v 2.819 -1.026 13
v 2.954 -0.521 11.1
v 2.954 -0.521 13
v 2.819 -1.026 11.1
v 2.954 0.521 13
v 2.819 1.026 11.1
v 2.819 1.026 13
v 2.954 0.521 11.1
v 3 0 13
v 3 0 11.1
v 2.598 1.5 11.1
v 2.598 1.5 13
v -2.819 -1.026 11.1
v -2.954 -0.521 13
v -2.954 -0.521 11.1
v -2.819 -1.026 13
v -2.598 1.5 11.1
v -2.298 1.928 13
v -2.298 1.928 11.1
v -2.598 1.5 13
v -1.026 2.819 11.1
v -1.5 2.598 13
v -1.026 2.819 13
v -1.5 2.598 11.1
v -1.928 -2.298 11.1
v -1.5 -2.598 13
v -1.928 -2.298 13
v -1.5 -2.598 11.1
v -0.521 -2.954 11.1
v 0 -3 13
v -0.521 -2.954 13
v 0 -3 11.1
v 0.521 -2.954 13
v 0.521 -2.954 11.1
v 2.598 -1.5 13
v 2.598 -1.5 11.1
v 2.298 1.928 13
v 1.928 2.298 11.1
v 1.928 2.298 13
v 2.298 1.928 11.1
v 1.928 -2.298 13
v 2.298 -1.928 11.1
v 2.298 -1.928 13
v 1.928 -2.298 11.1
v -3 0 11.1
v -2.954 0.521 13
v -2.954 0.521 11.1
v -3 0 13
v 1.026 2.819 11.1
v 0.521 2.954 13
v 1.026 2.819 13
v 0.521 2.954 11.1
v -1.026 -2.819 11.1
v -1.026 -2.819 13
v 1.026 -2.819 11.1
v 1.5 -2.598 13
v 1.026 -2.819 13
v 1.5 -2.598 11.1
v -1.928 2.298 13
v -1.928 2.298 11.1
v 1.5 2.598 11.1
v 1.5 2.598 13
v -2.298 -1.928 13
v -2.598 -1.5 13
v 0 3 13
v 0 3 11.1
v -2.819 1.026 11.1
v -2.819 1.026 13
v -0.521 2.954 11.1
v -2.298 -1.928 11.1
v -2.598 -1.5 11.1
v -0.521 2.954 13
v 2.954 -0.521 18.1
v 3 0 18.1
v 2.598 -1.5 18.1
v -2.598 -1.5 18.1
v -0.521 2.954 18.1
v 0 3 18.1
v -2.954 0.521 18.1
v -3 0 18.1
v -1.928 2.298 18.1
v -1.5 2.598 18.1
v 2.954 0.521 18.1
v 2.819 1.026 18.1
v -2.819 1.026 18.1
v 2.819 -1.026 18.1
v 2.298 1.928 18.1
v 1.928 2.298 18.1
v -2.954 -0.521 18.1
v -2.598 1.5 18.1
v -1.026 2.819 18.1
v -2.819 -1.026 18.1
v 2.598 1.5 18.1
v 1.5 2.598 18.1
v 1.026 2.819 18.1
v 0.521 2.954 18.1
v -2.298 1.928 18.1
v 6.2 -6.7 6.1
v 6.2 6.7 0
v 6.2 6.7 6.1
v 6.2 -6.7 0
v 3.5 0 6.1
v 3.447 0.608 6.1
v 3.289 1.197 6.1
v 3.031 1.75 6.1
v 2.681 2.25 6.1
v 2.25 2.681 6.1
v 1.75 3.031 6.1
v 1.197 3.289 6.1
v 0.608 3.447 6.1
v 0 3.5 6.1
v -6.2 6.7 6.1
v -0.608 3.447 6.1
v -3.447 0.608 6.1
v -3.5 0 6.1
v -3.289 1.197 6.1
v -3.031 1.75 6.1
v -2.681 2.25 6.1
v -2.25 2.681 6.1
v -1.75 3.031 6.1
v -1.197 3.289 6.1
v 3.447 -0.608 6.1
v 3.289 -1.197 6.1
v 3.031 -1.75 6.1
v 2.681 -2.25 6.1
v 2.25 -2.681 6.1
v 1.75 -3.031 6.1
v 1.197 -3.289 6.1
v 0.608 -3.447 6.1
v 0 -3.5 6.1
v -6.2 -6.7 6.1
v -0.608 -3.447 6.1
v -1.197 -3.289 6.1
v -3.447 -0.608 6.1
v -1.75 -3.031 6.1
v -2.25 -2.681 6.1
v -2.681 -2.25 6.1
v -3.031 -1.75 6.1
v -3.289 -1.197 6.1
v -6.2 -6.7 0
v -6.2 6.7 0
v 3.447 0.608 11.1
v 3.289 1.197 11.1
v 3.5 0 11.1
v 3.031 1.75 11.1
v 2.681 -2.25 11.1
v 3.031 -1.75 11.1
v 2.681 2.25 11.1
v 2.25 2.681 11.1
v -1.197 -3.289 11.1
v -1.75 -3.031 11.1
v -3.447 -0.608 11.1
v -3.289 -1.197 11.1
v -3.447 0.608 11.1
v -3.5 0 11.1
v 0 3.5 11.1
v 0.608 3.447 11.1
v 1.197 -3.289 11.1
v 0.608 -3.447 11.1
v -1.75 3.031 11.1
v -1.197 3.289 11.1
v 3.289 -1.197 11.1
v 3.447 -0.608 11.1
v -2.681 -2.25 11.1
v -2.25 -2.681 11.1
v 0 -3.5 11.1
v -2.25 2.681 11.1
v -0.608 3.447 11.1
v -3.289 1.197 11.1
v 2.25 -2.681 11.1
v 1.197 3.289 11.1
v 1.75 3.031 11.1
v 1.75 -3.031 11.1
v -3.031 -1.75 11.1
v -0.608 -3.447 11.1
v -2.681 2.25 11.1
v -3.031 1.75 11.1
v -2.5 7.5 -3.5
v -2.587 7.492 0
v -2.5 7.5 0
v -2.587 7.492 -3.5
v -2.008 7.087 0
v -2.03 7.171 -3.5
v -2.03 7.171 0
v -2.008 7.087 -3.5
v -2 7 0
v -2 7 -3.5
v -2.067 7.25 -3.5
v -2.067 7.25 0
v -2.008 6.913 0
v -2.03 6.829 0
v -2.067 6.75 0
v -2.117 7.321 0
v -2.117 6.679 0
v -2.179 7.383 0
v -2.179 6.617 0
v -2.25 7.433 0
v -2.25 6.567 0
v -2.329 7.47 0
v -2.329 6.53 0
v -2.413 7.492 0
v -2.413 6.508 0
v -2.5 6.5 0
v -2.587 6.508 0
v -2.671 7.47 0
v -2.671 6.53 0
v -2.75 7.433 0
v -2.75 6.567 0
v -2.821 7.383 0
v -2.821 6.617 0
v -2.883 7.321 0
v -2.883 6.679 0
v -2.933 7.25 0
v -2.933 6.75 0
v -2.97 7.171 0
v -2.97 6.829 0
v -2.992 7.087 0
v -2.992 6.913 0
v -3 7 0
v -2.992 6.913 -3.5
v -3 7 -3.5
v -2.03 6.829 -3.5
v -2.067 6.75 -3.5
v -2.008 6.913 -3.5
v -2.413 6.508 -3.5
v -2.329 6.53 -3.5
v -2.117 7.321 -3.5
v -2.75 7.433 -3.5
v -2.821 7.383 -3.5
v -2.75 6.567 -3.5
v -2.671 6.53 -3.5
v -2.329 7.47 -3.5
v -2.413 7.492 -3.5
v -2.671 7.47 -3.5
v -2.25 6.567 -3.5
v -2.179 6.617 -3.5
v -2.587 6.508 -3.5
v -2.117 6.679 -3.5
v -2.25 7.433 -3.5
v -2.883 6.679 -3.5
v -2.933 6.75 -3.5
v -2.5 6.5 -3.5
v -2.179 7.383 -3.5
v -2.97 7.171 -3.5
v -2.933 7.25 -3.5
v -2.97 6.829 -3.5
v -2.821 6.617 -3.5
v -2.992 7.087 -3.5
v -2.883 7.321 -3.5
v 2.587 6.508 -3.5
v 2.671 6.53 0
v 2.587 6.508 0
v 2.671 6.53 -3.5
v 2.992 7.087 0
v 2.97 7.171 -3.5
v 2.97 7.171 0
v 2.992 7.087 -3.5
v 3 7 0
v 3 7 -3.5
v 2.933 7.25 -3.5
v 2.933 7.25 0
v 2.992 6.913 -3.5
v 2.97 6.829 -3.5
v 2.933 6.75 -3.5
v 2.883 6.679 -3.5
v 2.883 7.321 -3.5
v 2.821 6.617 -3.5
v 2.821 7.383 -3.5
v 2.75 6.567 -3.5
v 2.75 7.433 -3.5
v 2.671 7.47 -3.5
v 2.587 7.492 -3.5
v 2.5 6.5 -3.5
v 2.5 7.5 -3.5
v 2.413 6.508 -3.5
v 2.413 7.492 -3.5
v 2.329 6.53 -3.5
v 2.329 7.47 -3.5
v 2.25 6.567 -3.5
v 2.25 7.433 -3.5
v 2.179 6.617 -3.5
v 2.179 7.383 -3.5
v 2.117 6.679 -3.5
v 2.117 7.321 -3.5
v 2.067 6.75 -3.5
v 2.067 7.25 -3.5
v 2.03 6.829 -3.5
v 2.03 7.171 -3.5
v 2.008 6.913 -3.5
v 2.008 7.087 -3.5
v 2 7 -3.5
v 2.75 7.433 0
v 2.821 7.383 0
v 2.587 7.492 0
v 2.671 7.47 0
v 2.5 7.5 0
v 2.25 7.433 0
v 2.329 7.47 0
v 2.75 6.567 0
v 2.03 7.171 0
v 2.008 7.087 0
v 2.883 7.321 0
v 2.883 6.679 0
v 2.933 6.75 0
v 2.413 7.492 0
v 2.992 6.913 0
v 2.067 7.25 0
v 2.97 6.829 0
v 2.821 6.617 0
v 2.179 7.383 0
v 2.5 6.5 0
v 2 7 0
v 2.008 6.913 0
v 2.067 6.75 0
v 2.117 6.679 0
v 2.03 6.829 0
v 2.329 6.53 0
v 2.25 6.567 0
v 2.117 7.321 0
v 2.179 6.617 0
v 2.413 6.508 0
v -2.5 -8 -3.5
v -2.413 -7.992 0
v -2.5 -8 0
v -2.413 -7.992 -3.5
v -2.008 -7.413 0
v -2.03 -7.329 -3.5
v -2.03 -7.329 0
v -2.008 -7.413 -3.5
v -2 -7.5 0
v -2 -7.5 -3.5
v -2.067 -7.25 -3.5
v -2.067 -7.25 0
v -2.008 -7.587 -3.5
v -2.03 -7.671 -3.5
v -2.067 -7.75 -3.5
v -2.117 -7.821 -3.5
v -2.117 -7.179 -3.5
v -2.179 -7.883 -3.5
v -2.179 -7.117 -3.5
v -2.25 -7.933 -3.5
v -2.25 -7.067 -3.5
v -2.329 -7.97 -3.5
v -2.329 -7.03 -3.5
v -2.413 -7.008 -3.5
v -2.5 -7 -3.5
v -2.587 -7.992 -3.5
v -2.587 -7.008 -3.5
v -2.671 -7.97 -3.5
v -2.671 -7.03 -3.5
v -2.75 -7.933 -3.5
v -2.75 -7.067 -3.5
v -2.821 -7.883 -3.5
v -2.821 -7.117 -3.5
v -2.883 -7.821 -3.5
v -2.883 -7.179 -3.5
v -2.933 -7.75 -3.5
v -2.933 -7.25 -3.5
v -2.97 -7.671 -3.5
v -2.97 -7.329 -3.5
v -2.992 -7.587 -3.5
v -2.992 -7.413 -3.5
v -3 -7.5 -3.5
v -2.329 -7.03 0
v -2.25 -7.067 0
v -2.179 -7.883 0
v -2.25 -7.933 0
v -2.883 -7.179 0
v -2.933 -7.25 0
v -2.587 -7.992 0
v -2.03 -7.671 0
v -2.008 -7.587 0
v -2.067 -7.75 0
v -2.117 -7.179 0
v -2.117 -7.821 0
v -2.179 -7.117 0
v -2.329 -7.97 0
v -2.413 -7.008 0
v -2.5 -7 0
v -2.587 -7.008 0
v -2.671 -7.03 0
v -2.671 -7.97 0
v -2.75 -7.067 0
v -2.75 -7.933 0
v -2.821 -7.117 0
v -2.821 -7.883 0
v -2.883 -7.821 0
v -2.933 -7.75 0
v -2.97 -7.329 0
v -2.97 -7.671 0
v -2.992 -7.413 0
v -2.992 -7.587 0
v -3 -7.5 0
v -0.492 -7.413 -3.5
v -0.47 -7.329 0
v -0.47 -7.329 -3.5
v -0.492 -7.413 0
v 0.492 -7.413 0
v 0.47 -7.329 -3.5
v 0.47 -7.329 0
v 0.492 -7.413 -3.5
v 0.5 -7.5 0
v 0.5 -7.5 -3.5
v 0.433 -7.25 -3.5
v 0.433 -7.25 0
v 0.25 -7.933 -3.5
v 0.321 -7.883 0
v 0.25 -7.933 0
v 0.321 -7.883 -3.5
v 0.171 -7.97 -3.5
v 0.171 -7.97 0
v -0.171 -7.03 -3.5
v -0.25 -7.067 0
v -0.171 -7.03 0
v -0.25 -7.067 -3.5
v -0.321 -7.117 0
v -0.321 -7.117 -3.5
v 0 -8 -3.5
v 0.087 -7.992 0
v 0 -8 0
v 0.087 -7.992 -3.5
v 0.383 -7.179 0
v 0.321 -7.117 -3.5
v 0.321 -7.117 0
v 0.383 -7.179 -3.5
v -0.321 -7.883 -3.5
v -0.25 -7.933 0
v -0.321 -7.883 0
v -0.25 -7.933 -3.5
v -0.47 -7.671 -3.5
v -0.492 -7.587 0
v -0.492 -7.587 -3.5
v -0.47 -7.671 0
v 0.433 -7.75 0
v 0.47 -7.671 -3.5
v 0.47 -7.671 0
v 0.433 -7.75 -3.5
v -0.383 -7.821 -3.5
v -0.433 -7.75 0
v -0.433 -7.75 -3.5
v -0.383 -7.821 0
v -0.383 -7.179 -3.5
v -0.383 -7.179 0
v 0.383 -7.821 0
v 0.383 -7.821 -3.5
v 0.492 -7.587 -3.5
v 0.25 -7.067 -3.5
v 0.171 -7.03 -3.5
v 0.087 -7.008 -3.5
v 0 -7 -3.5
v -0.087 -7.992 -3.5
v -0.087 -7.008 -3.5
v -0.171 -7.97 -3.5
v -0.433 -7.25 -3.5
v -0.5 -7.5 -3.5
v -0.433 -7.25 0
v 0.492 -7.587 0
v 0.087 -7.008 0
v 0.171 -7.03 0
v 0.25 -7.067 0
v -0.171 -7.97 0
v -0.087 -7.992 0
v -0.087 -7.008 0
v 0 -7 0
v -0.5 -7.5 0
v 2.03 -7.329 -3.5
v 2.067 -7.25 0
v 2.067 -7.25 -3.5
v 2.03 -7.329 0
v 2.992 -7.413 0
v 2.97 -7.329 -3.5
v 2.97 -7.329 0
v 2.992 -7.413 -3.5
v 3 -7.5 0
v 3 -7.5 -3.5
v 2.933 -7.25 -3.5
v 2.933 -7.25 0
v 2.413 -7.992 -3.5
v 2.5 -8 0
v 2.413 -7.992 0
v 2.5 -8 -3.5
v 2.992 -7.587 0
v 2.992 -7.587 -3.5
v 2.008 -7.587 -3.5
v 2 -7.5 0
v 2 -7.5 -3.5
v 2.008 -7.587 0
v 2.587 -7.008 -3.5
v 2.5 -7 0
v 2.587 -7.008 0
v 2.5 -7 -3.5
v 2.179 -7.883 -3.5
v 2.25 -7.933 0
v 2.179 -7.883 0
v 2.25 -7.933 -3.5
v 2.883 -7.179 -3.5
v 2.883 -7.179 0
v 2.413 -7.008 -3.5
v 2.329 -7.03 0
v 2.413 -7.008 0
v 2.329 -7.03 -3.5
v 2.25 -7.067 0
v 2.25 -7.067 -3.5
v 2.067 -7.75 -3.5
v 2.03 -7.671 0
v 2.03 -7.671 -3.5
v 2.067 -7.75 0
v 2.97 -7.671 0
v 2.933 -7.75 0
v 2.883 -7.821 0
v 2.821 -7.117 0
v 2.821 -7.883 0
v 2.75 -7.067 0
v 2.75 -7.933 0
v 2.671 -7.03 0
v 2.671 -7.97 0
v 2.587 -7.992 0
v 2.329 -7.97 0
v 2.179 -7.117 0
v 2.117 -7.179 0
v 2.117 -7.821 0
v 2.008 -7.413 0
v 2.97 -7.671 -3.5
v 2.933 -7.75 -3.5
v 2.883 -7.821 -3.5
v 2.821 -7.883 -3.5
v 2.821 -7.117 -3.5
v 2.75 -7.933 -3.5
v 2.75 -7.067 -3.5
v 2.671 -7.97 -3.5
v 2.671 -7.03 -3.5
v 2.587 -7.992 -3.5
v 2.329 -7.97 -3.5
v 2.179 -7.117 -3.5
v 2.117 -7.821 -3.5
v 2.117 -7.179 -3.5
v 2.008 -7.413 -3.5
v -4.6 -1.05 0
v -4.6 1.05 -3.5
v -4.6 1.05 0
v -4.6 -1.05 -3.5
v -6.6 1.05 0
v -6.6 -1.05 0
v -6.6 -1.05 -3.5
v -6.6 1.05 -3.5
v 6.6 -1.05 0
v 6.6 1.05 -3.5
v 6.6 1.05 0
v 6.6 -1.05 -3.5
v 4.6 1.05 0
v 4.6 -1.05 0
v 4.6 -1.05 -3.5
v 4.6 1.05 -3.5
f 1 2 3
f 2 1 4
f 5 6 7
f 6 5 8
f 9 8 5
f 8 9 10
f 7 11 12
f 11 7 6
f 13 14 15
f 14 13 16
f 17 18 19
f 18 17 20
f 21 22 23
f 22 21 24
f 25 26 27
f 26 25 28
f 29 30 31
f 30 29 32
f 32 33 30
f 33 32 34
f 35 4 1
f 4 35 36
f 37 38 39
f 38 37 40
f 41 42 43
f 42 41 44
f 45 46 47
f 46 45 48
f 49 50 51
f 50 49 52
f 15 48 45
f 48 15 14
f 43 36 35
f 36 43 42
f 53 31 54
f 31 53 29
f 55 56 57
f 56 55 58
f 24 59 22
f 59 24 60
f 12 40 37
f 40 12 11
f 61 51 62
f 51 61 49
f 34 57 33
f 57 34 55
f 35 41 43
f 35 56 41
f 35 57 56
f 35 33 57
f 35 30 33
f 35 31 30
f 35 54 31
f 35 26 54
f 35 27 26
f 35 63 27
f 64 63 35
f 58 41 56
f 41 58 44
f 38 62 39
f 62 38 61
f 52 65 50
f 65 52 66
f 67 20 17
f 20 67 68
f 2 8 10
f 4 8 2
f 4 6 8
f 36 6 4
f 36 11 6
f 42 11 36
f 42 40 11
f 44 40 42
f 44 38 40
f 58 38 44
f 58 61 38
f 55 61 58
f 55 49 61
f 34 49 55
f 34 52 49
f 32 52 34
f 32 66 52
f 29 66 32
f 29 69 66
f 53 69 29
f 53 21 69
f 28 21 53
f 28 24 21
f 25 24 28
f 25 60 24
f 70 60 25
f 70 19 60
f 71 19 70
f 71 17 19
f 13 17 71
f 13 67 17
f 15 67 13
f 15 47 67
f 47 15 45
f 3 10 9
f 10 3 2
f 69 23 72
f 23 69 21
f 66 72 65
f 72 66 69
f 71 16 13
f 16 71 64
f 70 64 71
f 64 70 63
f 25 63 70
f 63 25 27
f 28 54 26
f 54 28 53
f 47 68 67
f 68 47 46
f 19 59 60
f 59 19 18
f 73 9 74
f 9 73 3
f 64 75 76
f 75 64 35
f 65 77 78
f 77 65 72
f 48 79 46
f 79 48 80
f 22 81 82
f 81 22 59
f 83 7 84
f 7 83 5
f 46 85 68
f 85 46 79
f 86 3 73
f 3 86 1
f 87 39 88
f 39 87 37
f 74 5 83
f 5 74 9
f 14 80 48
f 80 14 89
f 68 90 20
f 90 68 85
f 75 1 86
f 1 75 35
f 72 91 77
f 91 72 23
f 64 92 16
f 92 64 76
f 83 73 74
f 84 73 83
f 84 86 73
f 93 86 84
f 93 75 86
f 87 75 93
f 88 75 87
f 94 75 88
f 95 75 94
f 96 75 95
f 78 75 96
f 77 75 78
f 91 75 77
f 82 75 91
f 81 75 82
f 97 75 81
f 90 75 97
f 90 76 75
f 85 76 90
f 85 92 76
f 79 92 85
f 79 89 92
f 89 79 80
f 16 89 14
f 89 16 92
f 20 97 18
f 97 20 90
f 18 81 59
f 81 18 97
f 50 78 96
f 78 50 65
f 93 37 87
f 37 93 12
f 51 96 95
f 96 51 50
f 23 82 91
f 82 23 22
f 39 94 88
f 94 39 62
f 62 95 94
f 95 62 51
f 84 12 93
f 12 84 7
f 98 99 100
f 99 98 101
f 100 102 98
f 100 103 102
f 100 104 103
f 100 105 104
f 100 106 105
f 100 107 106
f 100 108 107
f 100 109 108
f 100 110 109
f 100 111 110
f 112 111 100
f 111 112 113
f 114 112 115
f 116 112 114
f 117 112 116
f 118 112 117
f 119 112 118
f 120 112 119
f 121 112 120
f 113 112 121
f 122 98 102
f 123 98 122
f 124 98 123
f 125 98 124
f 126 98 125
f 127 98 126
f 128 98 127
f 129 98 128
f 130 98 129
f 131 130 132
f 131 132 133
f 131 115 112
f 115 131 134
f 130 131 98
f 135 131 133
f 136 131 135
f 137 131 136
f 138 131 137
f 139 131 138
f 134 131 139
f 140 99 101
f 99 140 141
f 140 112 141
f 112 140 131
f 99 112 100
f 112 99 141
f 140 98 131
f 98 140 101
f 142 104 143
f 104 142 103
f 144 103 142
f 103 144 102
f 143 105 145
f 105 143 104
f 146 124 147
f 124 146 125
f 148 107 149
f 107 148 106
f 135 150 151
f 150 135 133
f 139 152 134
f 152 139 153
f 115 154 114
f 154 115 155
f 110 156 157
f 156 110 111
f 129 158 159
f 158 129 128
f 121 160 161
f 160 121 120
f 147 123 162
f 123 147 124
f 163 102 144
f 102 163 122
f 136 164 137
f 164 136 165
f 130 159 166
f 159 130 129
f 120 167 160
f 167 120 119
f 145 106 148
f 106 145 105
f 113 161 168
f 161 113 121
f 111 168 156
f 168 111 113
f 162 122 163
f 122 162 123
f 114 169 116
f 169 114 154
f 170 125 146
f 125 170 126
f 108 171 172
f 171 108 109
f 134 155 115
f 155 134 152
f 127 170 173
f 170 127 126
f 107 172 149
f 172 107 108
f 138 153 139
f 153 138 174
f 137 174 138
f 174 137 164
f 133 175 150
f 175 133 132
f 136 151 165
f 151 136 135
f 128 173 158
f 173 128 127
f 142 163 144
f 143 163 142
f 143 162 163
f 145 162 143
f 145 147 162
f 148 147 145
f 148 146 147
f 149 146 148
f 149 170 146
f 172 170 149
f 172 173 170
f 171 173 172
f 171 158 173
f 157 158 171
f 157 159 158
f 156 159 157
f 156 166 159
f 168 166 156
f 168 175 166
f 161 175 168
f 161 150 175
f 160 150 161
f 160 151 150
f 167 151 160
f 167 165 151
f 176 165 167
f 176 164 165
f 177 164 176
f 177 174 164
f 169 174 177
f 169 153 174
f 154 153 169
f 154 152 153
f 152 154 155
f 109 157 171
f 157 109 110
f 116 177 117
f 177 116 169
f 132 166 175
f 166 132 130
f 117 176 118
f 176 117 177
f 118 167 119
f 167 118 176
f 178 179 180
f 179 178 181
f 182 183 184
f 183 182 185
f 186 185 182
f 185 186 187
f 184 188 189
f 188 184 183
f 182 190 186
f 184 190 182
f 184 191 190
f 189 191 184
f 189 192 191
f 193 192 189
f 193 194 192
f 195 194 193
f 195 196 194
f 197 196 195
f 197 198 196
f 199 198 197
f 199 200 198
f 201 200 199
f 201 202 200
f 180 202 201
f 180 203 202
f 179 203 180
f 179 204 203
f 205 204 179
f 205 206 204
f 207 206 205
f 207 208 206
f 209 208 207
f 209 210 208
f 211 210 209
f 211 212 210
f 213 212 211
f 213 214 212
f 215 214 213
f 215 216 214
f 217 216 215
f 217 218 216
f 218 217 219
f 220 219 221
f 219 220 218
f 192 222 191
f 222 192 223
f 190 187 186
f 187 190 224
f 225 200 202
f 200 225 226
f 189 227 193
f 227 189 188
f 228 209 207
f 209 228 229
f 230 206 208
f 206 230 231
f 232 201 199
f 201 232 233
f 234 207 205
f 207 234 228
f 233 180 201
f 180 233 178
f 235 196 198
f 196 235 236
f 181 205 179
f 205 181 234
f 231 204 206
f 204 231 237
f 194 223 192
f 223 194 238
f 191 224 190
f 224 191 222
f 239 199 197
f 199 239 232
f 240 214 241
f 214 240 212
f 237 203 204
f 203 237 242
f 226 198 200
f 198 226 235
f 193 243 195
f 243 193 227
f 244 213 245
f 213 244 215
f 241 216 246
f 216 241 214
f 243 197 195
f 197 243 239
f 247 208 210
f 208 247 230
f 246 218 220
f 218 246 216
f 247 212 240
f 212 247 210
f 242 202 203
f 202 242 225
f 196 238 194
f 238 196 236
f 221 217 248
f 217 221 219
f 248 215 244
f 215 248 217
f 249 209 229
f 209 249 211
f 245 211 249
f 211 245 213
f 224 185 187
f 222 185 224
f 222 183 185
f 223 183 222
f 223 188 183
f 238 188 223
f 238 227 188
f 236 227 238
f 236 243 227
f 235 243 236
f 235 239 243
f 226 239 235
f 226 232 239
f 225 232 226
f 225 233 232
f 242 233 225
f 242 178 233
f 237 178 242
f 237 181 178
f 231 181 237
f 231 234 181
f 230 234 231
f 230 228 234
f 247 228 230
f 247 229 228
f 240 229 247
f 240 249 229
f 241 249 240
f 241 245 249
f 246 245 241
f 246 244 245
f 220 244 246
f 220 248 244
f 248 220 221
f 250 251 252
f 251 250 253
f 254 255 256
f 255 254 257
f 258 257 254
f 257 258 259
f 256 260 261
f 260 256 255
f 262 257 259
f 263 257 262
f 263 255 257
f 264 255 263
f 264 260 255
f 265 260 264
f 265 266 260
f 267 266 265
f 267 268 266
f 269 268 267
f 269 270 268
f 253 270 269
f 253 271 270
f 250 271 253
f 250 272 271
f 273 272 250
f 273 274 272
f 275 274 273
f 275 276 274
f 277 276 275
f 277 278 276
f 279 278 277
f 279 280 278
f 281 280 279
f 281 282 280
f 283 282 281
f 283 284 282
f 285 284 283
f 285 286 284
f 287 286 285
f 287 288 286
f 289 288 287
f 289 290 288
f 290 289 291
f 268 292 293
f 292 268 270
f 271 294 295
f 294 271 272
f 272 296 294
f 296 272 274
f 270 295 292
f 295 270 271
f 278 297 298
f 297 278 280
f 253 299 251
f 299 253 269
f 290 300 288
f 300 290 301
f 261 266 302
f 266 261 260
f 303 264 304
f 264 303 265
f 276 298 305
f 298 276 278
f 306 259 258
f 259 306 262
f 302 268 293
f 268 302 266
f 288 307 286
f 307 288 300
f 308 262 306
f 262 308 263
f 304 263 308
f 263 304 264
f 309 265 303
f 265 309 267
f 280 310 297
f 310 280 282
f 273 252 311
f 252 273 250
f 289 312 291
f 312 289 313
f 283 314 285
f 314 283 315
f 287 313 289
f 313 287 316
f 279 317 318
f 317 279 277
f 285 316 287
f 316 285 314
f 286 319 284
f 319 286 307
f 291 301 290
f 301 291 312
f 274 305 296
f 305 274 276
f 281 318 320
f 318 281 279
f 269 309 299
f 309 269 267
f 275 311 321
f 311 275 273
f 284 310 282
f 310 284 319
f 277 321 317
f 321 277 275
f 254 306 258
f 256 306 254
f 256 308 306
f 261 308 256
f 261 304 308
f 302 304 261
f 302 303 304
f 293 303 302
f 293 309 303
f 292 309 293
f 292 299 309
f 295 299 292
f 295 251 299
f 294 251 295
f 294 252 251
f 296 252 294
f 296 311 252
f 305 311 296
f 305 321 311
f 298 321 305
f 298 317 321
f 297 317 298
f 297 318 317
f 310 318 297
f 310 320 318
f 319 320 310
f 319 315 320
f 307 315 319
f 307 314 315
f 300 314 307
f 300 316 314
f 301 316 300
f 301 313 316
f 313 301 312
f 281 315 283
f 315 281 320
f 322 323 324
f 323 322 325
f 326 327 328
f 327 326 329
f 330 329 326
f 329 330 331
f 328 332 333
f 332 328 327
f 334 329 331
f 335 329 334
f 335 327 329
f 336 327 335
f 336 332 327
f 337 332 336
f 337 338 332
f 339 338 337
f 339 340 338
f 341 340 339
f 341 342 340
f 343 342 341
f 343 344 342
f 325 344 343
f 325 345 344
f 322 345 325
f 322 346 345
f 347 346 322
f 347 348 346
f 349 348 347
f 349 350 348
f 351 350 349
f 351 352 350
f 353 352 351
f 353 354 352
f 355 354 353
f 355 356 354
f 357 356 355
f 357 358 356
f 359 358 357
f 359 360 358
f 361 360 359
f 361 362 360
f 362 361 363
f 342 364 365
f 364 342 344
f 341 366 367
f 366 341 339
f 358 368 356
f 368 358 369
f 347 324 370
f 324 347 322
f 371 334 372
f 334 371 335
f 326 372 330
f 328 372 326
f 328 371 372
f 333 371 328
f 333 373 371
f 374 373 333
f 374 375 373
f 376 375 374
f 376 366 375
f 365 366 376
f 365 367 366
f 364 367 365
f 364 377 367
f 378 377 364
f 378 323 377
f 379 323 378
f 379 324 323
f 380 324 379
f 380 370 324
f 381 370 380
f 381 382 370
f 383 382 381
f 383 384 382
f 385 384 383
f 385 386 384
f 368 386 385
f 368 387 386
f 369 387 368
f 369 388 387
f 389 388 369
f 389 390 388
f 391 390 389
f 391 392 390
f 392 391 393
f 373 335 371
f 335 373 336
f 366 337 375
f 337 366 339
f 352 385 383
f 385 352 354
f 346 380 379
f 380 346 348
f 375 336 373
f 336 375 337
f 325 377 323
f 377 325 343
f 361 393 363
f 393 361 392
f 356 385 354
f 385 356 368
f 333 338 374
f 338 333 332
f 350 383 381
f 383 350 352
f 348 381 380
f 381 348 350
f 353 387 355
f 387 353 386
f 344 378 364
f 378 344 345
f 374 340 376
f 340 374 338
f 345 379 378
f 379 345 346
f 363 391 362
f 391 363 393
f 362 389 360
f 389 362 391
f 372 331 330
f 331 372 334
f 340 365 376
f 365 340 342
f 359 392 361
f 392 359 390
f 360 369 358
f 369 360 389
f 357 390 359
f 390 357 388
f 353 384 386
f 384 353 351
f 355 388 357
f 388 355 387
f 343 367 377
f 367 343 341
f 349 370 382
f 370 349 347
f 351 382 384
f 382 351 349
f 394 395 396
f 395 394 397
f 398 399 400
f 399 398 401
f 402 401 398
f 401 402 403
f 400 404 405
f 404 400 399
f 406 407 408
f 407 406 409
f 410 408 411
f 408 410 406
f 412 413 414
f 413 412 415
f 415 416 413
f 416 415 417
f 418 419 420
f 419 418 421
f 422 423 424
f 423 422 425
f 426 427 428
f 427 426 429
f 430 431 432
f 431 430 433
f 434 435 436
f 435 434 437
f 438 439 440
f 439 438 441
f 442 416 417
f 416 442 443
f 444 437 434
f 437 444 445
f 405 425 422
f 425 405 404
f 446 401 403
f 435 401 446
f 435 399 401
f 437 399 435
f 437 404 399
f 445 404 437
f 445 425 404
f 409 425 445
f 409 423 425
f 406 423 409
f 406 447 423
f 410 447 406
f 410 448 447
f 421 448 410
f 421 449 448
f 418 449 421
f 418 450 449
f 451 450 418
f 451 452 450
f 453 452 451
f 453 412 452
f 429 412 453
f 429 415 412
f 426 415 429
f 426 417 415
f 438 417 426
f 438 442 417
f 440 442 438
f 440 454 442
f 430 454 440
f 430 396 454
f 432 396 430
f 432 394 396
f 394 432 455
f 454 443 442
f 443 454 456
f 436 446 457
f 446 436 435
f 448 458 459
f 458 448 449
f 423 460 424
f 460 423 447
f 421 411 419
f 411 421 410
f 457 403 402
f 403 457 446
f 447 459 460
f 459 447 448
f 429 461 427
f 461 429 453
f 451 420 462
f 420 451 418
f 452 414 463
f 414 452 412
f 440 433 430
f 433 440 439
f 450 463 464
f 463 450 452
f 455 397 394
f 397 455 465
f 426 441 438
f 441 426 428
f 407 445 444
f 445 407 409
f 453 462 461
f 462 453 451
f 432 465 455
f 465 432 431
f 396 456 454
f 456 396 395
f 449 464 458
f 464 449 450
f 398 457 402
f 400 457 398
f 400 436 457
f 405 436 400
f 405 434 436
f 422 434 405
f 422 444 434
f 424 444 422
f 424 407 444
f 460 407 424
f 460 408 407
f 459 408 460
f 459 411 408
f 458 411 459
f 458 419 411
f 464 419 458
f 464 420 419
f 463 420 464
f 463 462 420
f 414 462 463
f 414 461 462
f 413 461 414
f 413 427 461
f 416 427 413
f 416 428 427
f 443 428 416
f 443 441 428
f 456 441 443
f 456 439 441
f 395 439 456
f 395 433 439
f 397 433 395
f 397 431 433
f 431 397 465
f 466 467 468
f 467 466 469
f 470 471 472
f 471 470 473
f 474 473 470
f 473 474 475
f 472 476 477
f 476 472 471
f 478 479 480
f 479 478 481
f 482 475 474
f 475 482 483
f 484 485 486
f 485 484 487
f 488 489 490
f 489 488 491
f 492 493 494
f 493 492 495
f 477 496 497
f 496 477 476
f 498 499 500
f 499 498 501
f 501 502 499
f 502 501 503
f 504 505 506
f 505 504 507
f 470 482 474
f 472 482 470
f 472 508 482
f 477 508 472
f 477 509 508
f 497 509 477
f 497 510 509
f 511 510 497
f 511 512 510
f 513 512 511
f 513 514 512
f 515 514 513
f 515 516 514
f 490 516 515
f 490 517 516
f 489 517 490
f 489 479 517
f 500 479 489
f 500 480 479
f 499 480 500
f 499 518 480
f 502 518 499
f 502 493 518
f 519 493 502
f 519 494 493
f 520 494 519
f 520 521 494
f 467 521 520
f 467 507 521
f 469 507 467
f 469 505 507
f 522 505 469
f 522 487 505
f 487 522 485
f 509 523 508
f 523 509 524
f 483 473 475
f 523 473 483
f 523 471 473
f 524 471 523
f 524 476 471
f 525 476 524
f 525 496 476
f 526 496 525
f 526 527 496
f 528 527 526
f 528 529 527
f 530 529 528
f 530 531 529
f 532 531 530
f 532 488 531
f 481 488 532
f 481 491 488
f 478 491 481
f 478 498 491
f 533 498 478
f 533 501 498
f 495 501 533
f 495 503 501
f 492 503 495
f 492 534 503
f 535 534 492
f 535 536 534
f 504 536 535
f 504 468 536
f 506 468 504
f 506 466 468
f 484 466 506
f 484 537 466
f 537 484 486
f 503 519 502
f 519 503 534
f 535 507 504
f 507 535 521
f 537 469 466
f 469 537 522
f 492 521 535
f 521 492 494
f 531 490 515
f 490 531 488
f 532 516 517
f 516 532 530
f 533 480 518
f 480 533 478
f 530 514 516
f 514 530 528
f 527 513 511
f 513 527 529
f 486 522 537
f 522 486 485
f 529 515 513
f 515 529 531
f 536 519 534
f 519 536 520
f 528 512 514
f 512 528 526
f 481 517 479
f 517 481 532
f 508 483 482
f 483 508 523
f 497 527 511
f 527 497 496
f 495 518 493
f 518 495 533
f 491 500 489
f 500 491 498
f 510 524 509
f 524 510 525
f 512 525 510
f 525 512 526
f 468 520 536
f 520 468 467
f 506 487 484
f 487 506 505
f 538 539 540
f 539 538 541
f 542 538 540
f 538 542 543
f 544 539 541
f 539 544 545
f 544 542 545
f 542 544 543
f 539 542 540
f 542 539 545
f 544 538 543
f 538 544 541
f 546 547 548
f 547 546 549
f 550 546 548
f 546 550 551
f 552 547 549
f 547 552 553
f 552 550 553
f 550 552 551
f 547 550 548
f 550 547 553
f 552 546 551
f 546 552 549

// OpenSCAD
// Bourns PEC12R-4x20F-Sxxxx
//
// This is a simplified model and details are omitted.

L = 20.0;
LB = 5.0;
F = 7.0;

color("gray") translate([0,0,6.1/2]) {
    cube([12.4,13.4,6.1], center=true);
    translate([0,0,6.1/2]) {
        cylinder(d=7, h=LB, $fn=36);
    };
    translate([0,0,6.1/2+LB]) {
        cylinder(d=6, h=L-6.1-LB-F, $fn=36);
        
        linear_extrude(F) {
            difference() {
                circle(d=6, $fn=36);
                translate([-3,-3]) {
                    square([6,1.5]);
                }
            }
        }
    }
}

color("silver") translate([0,0,-3.5]) {
    translate([-5/2,7]) {
        cylinder(d=1, h=3.5, $fn=36);
    }
    translate([5/2,7]) {
        cylinder(d=1, h=3.5, $fn=36);
    }
    translate([-5/2,-7.5]) {
        cylinder(d=1, h=3.5, $fn=36);
    }
    translate([0,-7.5]) {
        cylinder(d=1, h=3.5, $fn=36);
    }
    translate([5/2,-7.5]) {
        cylinder(d=1, h=3.5, $fn=36);
    }
    translate([-13.2/2,-2.1/2]) {
        cube([2.0,2.1,3.5]);
    }
    translate([13.2/2-2.0,-2.1/2]) {
        cube([2.0,2.1,3.5]);
    }
}
